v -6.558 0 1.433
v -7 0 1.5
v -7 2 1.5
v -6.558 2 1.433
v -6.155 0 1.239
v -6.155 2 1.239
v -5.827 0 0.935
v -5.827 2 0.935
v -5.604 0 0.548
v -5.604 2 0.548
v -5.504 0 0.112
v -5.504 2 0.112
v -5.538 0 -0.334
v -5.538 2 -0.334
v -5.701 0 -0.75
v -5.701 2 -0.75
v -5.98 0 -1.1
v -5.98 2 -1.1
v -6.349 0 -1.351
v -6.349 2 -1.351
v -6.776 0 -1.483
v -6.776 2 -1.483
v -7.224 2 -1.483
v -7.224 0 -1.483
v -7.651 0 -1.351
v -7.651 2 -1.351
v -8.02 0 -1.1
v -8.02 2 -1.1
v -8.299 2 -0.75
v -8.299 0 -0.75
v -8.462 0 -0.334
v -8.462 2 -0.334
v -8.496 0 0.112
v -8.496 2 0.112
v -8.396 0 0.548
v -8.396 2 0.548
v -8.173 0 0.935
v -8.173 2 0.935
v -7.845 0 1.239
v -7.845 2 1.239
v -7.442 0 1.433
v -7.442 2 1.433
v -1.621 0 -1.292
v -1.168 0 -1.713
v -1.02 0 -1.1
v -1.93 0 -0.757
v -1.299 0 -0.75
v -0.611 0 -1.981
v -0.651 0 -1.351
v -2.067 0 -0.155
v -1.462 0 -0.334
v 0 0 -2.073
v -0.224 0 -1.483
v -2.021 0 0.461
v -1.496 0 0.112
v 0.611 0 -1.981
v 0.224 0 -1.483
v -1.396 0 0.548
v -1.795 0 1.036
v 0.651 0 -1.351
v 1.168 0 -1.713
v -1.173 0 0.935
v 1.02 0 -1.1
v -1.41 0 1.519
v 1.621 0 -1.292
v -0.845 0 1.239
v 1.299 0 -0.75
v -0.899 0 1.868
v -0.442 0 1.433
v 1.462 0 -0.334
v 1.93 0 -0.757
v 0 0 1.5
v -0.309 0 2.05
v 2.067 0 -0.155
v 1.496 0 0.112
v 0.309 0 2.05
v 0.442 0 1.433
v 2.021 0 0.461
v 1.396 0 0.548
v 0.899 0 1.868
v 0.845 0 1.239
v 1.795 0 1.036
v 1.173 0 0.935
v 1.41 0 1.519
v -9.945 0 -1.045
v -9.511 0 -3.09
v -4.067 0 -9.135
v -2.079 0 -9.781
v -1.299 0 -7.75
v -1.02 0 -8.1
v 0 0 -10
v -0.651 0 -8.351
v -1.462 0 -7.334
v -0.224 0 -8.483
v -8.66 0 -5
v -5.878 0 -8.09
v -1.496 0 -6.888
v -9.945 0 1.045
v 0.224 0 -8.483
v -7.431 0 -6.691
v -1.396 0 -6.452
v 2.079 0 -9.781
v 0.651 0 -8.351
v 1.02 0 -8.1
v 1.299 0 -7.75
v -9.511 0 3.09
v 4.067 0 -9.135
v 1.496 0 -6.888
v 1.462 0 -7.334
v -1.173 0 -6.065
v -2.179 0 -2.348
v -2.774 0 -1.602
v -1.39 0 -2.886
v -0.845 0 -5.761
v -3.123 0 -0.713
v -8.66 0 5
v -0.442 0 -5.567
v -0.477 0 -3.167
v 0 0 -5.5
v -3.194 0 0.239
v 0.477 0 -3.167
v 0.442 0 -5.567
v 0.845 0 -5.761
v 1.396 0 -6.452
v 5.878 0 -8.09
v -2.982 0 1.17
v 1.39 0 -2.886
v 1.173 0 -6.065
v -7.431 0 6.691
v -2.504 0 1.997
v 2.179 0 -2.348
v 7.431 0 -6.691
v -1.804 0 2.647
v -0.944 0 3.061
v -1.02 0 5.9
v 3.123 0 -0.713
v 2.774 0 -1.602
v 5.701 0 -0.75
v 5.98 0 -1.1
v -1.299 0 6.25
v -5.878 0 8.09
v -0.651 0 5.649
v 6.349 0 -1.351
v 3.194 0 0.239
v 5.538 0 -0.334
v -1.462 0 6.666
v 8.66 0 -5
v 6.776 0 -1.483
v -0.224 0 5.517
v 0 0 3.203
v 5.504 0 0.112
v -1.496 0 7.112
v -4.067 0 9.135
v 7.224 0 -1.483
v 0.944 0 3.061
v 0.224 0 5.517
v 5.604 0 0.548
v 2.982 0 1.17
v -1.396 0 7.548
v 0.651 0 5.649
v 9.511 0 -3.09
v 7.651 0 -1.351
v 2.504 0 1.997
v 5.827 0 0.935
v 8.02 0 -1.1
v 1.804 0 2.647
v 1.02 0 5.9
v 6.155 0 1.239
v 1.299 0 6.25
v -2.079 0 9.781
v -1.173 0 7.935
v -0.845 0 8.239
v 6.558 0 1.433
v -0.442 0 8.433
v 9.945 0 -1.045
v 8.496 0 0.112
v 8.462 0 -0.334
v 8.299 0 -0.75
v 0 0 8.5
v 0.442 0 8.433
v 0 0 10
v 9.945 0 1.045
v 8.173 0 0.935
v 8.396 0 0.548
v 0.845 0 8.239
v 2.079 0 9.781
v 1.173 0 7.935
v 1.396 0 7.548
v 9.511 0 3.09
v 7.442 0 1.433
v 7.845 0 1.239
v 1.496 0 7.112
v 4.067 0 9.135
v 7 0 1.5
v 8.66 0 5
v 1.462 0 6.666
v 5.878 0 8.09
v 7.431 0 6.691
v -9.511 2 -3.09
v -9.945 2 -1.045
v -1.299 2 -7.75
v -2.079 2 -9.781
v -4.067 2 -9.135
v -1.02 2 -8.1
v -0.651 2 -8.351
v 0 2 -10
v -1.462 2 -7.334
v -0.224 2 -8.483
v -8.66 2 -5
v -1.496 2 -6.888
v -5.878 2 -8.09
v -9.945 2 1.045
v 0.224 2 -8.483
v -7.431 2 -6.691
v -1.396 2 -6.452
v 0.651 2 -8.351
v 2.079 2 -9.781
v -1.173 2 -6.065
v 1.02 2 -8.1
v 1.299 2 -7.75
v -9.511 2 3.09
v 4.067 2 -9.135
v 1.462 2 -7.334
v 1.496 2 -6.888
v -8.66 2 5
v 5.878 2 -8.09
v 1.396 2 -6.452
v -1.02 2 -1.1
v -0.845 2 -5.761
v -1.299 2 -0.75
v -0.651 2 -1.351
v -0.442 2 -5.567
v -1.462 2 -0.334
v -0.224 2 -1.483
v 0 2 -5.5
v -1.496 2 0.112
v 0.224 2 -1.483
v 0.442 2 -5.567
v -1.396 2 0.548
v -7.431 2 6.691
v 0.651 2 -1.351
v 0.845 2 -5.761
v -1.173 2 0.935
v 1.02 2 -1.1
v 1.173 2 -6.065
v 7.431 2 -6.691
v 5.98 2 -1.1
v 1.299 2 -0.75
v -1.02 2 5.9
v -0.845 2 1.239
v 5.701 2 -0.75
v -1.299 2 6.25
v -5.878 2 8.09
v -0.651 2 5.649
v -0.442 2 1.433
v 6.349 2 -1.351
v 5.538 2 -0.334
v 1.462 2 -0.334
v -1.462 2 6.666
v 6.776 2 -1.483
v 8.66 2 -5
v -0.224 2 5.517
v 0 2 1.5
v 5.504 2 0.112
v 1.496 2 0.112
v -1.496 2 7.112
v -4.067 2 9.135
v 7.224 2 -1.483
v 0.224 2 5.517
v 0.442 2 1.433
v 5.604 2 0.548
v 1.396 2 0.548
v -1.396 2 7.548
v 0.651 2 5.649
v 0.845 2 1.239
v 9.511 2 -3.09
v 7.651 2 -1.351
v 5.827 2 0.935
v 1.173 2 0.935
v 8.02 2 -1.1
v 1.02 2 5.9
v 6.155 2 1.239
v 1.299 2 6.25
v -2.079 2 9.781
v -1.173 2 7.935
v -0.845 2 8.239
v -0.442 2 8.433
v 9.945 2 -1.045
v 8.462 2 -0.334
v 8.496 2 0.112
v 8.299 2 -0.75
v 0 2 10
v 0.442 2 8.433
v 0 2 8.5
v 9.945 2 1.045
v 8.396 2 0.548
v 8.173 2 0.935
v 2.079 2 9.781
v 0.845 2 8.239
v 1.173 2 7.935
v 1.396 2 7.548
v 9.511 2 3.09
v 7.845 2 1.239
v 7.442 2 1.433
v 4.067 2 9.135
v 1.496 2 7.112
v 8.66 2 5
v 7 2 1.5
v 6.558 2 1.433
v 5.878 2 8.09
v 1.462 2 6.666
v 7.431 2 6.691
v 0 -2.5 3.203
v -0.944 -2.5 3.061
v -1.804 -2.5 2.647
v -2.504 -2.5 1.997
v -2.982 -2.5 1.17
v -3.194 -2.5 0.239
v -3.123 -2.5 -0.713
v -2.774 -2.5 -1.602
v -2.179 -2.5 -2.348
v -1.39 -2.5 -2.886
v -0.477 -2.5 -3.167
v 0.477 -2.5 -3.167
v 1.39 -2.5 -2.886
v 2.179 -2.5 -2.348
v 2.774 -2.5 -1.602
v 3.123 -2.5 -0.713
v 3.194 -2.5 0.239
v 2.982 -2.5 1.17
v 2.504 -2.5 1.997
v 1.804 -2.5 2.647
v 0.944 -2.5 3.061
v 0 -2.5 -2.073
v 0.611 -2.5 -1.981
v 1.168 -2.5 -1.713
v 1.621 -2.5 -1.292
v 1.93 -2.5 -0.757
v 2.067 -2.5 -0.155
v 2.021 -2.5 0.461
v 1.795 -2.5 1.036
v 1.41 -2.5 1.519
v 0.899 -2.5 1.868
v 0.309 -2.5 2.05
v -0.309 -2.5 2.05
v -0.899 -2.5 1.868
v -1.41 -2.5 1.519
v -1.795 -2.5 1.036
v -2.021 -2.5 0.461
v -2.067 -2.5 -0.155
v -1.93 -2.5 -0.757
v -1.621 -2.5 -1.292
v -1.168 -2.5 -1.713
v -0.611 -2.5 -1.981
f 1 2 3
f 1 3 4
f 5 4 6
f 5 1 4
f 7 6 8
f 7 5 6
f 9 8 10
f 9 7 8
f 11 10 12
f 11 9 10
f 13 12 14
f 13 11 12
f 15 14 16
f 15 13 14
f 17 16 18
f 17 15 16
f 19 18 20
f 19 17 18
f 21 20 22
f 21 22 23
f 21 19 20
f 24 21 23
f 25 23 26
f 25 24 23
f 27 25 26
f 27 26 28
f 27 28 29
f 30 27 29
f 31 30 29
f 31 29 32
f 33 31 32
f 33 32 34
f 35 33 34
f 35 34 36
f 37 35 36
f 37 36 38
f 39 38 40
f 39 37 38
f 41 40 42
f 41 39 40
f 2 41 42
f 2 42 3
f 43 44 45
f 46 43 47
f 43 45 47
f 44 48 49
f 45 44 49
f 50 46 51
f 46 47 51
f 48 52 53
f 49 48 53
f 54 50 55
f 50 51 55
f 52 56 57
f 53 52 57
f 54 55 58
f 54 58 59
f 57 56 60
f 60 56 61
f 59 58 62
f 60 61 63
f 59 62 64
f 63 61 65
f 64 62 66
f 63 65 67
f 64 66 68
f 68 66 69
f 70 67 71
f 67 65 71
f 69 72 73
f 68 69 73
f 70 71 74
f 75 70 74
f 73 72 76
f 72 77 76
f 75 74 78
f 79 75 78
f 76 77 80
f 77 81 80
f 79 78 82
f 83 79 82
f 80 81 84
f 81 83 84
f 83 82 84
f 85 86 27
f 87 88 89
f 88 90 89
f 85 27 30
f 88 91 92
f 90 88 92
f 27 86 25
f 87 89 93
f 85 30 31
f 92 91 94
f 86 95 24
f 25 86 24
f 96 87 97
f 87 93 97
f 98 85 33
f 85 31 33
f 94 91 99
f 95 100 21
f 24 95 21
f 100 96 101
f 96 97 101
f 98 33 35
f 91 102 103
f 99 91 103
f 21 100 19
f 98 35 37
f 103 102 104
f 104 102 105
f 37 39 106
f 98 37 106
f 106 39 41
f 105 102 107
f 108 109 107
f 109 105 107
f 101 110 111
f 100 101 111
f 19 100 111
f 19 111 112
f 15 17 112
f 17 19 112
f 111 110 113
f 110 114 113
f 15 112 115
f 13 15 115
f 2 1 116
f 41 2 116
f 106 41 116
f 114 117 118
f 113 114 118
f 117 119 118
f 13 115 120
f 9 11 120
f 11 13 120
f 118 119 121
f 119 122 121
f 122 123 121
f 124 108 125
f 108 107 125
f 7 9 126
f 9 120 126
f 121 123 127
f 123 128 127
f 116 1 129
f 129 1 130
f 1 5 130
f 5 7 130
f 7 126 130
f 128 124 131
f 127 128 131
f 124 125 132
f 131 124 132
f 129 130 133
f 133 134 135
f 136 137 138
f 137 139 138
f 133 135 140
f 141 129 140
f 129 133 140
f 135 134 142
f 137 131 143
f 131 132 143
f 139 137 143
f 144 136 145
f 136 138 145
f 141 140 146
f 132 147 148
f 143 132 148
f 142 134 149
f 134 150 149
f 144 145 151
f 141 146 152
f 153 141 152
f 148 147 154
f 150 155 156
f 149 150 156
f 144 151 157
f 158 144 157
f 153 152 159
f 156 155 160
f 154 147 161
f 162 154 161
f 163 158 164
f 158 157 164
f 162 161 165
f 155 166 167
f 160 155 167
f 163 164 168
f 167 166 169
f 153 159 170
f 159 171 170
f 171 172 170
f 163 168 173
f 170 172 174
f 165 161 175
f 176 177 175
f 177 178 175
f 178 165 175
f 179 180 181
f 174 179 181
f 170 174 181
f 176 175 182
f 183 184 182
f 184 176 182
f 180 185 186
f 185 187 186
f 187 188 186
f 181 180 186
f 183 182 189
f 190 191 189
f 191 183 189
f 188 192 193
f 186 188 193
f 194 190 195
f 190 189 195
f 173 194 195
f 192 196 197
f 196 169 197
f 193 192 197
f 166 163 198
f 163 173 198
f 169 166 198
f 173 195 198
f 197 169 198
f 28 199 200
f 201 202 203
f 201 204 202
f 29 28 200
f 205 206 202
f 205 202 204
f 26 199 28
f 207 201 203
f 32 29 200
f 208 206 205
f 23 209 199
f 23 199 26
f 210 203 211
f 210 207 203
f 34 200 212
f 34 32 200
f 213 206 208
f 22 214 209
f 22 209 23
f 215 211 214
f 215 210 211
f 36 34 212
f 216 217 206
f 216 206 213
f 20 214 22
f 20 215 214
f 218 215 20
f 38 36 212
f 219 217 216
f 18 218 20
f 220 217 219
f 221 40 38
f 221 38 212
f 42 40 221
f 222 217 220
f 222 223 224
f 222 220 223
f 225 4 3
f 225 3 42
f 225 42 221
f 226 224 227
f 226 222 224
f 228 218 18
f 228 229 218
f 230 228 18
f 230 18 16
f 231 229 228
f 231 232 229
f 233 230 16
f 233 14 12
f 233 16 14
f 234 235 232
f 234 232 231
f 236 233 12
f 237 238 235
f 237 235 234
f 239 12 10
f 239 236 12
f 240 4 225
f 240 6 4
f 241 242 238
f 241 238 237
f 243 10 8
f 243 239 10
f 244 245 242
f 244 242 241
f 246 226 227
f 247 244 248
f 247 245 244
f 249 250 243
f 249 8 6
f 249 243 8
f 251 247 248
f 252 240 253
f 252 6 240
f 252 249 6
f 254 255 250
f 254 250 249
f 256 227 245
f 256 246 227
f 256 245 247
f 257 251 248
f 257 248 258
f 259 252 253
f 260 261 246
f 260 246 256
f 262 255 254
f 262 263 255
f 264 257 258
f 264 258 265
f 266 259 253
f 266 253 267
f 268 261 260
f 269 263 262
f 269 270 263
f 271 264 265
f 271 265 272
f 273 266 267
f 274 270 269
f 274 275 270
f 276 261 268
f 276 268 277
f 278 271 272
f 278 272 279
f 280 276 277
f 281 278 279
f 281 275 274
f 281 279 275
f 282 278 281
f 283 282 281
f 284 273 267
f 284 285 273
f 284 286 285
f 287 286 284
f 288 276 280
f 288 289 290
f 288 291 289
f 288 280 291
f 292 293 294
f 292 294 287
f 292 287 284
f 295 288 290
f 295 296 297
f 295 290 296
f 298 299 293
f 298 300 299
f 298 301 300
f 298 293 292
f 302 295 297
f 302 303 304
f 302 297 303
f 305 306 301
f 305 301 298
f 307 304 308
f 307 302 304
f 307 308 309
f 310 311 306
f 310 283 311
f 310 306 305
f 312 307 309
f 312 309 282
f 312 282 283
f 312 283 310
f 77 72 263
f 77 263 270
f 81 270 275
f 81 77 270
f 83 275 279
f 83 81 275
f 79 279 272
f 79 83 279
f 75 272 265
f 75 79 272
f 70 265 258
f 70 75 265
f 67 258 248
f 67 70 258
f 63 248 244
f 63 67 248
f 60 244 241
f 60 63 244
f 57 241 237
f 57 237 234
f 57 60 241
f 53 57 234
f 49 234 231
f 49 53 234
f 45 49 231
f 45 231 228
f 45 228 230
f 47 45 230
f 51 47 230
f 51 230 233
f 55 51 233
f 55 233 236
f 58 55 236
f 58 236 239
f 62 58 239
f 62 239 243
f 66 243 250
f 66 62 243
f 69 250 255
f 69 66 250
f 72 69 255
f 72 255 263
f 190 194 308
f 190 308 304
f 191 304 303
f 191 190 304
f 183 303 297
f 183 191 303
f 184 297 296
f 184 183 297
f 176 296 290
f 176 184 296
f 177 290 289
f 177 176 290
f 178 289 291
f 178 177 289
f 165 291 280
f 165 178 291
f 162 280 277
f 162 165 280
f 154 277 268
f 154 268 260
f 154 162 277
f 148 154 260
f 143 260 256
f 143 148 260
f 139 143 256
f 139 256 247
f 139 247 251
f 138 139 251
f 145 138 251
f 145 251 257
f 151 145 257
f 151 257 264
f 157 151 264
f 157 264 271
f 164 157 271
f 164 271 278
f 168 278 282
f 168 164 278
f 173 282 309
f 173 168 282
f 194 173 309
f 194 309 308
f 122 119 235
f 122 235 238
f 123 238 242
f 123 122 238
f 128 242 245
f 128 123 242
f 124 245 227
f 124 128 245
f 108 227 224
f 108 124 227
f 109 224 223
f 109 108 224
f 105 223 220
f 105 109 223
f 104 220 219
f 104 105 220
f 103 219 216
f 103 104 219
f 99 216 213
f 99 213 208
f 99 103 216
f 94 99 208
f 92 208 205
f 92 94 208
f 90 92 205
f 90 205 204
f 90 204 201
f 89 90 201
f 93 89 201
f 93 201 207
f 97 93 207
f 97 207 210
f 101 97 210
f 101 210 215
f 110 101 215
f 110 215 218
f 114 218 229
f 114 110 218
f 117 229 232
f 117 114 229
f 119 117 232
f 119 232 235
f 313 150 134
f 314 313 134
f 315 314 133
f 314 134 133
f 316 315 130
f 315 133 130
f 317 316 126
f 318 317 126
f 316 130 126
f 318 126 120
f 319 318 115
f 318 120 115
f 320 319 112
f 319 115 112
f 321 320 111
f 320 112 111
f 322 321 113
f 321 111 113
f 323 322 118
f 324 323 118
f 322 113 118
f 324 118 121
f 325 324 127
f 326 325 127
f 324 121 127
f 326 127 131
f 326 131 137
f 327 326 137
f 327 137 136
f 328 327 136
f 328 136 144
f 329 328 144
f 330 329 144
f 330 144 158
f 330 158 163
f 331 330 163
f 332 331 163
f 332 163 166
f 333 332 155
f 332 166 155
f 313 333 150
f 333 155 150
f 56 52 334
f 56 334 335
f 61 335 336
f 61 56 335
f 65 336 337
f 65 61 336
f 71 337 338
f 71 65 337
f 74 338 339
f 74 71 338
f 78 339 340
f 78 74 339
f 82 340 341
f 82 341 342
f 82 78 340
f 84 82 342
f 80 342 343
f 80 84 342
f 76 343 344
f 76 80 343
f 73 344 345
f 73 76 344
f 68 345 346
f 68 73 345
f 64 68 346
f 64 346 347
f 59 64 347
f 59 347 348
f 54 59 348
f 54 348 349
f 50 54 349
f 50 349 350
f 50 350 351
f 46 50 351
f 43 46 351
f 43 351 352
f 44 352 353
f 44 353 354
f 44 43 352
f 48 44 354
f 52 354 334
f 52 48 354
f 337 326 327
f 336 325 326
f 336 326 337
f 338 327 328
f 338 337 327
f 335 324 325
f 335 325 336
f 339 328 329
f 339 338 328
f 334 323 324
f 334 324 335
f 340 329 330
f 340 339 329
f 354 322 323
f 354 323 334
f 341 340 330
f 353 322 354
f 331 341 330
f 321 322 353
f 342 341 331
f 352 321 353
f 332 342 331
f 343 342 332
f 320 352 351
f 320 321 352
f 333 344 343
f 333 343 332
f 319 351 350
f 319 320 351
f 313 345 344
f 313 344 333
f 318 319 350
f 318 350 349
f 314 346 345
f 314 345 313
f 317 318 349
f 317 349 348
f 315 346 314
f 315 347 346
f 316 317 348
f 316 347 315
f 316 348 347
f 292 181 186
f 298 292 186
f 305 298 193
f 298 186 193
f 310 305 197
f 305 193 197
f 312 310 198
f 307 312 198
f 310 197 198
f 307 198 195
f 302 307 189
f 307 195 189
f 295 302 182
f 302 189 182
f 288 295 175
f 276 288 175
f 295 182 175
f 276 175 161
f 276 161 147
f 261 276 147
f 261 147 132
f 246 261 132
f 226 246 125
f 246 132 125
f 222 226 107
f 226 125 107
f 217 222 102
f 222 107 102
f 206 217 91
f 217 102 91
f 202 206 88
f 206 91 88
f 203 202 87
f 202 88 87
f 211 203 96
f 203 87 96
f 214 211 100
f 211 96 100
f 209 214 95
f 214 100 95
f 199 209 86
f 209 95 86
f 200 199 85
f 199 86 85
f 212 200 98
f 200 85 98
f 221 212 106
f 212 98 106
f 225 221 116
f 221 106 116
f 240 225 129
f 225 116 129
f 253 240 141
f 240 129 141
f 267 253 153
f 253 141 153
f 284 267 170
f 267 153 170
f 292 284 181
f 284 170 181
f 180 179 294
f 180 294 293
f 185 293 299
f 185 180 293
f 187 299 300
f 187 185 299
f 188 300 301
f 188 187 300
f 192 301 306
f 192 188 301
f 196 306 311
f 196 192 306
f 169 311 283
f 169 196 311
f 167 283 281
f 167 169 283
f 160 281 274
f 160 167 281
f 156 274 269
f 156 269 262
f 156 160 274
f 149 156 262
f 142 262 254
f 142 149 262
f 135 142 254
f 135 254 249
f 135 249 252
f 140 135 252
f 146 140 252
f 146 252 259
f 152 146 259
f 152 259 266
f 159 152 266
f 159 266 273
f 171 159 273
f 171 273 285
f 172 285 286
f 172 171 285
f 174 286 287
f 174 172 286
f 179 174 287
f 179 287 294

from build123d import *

# Parameters (mm, degrees)
SKETCH_1_R      = 10
SKETCH_1_R_2    = 1.5
EXTRUDE_1_DEPTH = 2
SKETCH_2_R      = 3.203165256
SKETCH_2_R_2    = 2.072813242
EXTRUDE_2_DEPTH = 2.5


with BuildPart() as part:
    # 草图1 → 凸台-拉伸1 (new body)
    with BuildSketch(Plane(origin=(0, 0, 0), x_dir=(1, 0, 0), z_dir=(0, 1, 0))):
        with Locations(Location((0, 0, 0), (0, 0, 270))):
            Circle(SKETCH_1_R)
        with Locations(Location((0, 7, 0), (0, 0, 270))):
            Circle(SKETCH_1_R_2, mode=Mode.SUBTRACT)
        with Locations(Location((7, 0, 0), (0, 0, 270))):
            Circle(SKETCH_1_R_2, mode=Mode.SUBTRACT)
        with Locations(Location((0, -7, 0), (0, 0, 270))):
            Circle(SKETCH_1_R_2, mode=Mode.SUBTRACT)
        with Locations(Location((-7, 0, 0), (0, 0, 270))):
            Circle(SKETCH_1_R_2, mode=Mode.SUBTRACT)
        with Locations(Location((0, 0, 0), (0, 0, 270))):
            Circle(SKETCH_1_R_2, mode=Mode.SUBTRACT)
    extrude(amount=EXTRUDE_1_DEPTH)

    # 草图2 → 凸台-拉伸2 (add)
    with BuildSketch(Plane.XZ):
        with Locations(Location((0, 0, 0), (0, 0, 90))):
            Circle(SKETCH_2_R)
        with Locations(Location((0, 0, 0), (0, 0, 270))):
            Circle(SKETCH_2_R_2, mode=Mode.SUBTRACT)
    extrude(amount=EXTRUDE_2_DEPTH)


solid = part.part
